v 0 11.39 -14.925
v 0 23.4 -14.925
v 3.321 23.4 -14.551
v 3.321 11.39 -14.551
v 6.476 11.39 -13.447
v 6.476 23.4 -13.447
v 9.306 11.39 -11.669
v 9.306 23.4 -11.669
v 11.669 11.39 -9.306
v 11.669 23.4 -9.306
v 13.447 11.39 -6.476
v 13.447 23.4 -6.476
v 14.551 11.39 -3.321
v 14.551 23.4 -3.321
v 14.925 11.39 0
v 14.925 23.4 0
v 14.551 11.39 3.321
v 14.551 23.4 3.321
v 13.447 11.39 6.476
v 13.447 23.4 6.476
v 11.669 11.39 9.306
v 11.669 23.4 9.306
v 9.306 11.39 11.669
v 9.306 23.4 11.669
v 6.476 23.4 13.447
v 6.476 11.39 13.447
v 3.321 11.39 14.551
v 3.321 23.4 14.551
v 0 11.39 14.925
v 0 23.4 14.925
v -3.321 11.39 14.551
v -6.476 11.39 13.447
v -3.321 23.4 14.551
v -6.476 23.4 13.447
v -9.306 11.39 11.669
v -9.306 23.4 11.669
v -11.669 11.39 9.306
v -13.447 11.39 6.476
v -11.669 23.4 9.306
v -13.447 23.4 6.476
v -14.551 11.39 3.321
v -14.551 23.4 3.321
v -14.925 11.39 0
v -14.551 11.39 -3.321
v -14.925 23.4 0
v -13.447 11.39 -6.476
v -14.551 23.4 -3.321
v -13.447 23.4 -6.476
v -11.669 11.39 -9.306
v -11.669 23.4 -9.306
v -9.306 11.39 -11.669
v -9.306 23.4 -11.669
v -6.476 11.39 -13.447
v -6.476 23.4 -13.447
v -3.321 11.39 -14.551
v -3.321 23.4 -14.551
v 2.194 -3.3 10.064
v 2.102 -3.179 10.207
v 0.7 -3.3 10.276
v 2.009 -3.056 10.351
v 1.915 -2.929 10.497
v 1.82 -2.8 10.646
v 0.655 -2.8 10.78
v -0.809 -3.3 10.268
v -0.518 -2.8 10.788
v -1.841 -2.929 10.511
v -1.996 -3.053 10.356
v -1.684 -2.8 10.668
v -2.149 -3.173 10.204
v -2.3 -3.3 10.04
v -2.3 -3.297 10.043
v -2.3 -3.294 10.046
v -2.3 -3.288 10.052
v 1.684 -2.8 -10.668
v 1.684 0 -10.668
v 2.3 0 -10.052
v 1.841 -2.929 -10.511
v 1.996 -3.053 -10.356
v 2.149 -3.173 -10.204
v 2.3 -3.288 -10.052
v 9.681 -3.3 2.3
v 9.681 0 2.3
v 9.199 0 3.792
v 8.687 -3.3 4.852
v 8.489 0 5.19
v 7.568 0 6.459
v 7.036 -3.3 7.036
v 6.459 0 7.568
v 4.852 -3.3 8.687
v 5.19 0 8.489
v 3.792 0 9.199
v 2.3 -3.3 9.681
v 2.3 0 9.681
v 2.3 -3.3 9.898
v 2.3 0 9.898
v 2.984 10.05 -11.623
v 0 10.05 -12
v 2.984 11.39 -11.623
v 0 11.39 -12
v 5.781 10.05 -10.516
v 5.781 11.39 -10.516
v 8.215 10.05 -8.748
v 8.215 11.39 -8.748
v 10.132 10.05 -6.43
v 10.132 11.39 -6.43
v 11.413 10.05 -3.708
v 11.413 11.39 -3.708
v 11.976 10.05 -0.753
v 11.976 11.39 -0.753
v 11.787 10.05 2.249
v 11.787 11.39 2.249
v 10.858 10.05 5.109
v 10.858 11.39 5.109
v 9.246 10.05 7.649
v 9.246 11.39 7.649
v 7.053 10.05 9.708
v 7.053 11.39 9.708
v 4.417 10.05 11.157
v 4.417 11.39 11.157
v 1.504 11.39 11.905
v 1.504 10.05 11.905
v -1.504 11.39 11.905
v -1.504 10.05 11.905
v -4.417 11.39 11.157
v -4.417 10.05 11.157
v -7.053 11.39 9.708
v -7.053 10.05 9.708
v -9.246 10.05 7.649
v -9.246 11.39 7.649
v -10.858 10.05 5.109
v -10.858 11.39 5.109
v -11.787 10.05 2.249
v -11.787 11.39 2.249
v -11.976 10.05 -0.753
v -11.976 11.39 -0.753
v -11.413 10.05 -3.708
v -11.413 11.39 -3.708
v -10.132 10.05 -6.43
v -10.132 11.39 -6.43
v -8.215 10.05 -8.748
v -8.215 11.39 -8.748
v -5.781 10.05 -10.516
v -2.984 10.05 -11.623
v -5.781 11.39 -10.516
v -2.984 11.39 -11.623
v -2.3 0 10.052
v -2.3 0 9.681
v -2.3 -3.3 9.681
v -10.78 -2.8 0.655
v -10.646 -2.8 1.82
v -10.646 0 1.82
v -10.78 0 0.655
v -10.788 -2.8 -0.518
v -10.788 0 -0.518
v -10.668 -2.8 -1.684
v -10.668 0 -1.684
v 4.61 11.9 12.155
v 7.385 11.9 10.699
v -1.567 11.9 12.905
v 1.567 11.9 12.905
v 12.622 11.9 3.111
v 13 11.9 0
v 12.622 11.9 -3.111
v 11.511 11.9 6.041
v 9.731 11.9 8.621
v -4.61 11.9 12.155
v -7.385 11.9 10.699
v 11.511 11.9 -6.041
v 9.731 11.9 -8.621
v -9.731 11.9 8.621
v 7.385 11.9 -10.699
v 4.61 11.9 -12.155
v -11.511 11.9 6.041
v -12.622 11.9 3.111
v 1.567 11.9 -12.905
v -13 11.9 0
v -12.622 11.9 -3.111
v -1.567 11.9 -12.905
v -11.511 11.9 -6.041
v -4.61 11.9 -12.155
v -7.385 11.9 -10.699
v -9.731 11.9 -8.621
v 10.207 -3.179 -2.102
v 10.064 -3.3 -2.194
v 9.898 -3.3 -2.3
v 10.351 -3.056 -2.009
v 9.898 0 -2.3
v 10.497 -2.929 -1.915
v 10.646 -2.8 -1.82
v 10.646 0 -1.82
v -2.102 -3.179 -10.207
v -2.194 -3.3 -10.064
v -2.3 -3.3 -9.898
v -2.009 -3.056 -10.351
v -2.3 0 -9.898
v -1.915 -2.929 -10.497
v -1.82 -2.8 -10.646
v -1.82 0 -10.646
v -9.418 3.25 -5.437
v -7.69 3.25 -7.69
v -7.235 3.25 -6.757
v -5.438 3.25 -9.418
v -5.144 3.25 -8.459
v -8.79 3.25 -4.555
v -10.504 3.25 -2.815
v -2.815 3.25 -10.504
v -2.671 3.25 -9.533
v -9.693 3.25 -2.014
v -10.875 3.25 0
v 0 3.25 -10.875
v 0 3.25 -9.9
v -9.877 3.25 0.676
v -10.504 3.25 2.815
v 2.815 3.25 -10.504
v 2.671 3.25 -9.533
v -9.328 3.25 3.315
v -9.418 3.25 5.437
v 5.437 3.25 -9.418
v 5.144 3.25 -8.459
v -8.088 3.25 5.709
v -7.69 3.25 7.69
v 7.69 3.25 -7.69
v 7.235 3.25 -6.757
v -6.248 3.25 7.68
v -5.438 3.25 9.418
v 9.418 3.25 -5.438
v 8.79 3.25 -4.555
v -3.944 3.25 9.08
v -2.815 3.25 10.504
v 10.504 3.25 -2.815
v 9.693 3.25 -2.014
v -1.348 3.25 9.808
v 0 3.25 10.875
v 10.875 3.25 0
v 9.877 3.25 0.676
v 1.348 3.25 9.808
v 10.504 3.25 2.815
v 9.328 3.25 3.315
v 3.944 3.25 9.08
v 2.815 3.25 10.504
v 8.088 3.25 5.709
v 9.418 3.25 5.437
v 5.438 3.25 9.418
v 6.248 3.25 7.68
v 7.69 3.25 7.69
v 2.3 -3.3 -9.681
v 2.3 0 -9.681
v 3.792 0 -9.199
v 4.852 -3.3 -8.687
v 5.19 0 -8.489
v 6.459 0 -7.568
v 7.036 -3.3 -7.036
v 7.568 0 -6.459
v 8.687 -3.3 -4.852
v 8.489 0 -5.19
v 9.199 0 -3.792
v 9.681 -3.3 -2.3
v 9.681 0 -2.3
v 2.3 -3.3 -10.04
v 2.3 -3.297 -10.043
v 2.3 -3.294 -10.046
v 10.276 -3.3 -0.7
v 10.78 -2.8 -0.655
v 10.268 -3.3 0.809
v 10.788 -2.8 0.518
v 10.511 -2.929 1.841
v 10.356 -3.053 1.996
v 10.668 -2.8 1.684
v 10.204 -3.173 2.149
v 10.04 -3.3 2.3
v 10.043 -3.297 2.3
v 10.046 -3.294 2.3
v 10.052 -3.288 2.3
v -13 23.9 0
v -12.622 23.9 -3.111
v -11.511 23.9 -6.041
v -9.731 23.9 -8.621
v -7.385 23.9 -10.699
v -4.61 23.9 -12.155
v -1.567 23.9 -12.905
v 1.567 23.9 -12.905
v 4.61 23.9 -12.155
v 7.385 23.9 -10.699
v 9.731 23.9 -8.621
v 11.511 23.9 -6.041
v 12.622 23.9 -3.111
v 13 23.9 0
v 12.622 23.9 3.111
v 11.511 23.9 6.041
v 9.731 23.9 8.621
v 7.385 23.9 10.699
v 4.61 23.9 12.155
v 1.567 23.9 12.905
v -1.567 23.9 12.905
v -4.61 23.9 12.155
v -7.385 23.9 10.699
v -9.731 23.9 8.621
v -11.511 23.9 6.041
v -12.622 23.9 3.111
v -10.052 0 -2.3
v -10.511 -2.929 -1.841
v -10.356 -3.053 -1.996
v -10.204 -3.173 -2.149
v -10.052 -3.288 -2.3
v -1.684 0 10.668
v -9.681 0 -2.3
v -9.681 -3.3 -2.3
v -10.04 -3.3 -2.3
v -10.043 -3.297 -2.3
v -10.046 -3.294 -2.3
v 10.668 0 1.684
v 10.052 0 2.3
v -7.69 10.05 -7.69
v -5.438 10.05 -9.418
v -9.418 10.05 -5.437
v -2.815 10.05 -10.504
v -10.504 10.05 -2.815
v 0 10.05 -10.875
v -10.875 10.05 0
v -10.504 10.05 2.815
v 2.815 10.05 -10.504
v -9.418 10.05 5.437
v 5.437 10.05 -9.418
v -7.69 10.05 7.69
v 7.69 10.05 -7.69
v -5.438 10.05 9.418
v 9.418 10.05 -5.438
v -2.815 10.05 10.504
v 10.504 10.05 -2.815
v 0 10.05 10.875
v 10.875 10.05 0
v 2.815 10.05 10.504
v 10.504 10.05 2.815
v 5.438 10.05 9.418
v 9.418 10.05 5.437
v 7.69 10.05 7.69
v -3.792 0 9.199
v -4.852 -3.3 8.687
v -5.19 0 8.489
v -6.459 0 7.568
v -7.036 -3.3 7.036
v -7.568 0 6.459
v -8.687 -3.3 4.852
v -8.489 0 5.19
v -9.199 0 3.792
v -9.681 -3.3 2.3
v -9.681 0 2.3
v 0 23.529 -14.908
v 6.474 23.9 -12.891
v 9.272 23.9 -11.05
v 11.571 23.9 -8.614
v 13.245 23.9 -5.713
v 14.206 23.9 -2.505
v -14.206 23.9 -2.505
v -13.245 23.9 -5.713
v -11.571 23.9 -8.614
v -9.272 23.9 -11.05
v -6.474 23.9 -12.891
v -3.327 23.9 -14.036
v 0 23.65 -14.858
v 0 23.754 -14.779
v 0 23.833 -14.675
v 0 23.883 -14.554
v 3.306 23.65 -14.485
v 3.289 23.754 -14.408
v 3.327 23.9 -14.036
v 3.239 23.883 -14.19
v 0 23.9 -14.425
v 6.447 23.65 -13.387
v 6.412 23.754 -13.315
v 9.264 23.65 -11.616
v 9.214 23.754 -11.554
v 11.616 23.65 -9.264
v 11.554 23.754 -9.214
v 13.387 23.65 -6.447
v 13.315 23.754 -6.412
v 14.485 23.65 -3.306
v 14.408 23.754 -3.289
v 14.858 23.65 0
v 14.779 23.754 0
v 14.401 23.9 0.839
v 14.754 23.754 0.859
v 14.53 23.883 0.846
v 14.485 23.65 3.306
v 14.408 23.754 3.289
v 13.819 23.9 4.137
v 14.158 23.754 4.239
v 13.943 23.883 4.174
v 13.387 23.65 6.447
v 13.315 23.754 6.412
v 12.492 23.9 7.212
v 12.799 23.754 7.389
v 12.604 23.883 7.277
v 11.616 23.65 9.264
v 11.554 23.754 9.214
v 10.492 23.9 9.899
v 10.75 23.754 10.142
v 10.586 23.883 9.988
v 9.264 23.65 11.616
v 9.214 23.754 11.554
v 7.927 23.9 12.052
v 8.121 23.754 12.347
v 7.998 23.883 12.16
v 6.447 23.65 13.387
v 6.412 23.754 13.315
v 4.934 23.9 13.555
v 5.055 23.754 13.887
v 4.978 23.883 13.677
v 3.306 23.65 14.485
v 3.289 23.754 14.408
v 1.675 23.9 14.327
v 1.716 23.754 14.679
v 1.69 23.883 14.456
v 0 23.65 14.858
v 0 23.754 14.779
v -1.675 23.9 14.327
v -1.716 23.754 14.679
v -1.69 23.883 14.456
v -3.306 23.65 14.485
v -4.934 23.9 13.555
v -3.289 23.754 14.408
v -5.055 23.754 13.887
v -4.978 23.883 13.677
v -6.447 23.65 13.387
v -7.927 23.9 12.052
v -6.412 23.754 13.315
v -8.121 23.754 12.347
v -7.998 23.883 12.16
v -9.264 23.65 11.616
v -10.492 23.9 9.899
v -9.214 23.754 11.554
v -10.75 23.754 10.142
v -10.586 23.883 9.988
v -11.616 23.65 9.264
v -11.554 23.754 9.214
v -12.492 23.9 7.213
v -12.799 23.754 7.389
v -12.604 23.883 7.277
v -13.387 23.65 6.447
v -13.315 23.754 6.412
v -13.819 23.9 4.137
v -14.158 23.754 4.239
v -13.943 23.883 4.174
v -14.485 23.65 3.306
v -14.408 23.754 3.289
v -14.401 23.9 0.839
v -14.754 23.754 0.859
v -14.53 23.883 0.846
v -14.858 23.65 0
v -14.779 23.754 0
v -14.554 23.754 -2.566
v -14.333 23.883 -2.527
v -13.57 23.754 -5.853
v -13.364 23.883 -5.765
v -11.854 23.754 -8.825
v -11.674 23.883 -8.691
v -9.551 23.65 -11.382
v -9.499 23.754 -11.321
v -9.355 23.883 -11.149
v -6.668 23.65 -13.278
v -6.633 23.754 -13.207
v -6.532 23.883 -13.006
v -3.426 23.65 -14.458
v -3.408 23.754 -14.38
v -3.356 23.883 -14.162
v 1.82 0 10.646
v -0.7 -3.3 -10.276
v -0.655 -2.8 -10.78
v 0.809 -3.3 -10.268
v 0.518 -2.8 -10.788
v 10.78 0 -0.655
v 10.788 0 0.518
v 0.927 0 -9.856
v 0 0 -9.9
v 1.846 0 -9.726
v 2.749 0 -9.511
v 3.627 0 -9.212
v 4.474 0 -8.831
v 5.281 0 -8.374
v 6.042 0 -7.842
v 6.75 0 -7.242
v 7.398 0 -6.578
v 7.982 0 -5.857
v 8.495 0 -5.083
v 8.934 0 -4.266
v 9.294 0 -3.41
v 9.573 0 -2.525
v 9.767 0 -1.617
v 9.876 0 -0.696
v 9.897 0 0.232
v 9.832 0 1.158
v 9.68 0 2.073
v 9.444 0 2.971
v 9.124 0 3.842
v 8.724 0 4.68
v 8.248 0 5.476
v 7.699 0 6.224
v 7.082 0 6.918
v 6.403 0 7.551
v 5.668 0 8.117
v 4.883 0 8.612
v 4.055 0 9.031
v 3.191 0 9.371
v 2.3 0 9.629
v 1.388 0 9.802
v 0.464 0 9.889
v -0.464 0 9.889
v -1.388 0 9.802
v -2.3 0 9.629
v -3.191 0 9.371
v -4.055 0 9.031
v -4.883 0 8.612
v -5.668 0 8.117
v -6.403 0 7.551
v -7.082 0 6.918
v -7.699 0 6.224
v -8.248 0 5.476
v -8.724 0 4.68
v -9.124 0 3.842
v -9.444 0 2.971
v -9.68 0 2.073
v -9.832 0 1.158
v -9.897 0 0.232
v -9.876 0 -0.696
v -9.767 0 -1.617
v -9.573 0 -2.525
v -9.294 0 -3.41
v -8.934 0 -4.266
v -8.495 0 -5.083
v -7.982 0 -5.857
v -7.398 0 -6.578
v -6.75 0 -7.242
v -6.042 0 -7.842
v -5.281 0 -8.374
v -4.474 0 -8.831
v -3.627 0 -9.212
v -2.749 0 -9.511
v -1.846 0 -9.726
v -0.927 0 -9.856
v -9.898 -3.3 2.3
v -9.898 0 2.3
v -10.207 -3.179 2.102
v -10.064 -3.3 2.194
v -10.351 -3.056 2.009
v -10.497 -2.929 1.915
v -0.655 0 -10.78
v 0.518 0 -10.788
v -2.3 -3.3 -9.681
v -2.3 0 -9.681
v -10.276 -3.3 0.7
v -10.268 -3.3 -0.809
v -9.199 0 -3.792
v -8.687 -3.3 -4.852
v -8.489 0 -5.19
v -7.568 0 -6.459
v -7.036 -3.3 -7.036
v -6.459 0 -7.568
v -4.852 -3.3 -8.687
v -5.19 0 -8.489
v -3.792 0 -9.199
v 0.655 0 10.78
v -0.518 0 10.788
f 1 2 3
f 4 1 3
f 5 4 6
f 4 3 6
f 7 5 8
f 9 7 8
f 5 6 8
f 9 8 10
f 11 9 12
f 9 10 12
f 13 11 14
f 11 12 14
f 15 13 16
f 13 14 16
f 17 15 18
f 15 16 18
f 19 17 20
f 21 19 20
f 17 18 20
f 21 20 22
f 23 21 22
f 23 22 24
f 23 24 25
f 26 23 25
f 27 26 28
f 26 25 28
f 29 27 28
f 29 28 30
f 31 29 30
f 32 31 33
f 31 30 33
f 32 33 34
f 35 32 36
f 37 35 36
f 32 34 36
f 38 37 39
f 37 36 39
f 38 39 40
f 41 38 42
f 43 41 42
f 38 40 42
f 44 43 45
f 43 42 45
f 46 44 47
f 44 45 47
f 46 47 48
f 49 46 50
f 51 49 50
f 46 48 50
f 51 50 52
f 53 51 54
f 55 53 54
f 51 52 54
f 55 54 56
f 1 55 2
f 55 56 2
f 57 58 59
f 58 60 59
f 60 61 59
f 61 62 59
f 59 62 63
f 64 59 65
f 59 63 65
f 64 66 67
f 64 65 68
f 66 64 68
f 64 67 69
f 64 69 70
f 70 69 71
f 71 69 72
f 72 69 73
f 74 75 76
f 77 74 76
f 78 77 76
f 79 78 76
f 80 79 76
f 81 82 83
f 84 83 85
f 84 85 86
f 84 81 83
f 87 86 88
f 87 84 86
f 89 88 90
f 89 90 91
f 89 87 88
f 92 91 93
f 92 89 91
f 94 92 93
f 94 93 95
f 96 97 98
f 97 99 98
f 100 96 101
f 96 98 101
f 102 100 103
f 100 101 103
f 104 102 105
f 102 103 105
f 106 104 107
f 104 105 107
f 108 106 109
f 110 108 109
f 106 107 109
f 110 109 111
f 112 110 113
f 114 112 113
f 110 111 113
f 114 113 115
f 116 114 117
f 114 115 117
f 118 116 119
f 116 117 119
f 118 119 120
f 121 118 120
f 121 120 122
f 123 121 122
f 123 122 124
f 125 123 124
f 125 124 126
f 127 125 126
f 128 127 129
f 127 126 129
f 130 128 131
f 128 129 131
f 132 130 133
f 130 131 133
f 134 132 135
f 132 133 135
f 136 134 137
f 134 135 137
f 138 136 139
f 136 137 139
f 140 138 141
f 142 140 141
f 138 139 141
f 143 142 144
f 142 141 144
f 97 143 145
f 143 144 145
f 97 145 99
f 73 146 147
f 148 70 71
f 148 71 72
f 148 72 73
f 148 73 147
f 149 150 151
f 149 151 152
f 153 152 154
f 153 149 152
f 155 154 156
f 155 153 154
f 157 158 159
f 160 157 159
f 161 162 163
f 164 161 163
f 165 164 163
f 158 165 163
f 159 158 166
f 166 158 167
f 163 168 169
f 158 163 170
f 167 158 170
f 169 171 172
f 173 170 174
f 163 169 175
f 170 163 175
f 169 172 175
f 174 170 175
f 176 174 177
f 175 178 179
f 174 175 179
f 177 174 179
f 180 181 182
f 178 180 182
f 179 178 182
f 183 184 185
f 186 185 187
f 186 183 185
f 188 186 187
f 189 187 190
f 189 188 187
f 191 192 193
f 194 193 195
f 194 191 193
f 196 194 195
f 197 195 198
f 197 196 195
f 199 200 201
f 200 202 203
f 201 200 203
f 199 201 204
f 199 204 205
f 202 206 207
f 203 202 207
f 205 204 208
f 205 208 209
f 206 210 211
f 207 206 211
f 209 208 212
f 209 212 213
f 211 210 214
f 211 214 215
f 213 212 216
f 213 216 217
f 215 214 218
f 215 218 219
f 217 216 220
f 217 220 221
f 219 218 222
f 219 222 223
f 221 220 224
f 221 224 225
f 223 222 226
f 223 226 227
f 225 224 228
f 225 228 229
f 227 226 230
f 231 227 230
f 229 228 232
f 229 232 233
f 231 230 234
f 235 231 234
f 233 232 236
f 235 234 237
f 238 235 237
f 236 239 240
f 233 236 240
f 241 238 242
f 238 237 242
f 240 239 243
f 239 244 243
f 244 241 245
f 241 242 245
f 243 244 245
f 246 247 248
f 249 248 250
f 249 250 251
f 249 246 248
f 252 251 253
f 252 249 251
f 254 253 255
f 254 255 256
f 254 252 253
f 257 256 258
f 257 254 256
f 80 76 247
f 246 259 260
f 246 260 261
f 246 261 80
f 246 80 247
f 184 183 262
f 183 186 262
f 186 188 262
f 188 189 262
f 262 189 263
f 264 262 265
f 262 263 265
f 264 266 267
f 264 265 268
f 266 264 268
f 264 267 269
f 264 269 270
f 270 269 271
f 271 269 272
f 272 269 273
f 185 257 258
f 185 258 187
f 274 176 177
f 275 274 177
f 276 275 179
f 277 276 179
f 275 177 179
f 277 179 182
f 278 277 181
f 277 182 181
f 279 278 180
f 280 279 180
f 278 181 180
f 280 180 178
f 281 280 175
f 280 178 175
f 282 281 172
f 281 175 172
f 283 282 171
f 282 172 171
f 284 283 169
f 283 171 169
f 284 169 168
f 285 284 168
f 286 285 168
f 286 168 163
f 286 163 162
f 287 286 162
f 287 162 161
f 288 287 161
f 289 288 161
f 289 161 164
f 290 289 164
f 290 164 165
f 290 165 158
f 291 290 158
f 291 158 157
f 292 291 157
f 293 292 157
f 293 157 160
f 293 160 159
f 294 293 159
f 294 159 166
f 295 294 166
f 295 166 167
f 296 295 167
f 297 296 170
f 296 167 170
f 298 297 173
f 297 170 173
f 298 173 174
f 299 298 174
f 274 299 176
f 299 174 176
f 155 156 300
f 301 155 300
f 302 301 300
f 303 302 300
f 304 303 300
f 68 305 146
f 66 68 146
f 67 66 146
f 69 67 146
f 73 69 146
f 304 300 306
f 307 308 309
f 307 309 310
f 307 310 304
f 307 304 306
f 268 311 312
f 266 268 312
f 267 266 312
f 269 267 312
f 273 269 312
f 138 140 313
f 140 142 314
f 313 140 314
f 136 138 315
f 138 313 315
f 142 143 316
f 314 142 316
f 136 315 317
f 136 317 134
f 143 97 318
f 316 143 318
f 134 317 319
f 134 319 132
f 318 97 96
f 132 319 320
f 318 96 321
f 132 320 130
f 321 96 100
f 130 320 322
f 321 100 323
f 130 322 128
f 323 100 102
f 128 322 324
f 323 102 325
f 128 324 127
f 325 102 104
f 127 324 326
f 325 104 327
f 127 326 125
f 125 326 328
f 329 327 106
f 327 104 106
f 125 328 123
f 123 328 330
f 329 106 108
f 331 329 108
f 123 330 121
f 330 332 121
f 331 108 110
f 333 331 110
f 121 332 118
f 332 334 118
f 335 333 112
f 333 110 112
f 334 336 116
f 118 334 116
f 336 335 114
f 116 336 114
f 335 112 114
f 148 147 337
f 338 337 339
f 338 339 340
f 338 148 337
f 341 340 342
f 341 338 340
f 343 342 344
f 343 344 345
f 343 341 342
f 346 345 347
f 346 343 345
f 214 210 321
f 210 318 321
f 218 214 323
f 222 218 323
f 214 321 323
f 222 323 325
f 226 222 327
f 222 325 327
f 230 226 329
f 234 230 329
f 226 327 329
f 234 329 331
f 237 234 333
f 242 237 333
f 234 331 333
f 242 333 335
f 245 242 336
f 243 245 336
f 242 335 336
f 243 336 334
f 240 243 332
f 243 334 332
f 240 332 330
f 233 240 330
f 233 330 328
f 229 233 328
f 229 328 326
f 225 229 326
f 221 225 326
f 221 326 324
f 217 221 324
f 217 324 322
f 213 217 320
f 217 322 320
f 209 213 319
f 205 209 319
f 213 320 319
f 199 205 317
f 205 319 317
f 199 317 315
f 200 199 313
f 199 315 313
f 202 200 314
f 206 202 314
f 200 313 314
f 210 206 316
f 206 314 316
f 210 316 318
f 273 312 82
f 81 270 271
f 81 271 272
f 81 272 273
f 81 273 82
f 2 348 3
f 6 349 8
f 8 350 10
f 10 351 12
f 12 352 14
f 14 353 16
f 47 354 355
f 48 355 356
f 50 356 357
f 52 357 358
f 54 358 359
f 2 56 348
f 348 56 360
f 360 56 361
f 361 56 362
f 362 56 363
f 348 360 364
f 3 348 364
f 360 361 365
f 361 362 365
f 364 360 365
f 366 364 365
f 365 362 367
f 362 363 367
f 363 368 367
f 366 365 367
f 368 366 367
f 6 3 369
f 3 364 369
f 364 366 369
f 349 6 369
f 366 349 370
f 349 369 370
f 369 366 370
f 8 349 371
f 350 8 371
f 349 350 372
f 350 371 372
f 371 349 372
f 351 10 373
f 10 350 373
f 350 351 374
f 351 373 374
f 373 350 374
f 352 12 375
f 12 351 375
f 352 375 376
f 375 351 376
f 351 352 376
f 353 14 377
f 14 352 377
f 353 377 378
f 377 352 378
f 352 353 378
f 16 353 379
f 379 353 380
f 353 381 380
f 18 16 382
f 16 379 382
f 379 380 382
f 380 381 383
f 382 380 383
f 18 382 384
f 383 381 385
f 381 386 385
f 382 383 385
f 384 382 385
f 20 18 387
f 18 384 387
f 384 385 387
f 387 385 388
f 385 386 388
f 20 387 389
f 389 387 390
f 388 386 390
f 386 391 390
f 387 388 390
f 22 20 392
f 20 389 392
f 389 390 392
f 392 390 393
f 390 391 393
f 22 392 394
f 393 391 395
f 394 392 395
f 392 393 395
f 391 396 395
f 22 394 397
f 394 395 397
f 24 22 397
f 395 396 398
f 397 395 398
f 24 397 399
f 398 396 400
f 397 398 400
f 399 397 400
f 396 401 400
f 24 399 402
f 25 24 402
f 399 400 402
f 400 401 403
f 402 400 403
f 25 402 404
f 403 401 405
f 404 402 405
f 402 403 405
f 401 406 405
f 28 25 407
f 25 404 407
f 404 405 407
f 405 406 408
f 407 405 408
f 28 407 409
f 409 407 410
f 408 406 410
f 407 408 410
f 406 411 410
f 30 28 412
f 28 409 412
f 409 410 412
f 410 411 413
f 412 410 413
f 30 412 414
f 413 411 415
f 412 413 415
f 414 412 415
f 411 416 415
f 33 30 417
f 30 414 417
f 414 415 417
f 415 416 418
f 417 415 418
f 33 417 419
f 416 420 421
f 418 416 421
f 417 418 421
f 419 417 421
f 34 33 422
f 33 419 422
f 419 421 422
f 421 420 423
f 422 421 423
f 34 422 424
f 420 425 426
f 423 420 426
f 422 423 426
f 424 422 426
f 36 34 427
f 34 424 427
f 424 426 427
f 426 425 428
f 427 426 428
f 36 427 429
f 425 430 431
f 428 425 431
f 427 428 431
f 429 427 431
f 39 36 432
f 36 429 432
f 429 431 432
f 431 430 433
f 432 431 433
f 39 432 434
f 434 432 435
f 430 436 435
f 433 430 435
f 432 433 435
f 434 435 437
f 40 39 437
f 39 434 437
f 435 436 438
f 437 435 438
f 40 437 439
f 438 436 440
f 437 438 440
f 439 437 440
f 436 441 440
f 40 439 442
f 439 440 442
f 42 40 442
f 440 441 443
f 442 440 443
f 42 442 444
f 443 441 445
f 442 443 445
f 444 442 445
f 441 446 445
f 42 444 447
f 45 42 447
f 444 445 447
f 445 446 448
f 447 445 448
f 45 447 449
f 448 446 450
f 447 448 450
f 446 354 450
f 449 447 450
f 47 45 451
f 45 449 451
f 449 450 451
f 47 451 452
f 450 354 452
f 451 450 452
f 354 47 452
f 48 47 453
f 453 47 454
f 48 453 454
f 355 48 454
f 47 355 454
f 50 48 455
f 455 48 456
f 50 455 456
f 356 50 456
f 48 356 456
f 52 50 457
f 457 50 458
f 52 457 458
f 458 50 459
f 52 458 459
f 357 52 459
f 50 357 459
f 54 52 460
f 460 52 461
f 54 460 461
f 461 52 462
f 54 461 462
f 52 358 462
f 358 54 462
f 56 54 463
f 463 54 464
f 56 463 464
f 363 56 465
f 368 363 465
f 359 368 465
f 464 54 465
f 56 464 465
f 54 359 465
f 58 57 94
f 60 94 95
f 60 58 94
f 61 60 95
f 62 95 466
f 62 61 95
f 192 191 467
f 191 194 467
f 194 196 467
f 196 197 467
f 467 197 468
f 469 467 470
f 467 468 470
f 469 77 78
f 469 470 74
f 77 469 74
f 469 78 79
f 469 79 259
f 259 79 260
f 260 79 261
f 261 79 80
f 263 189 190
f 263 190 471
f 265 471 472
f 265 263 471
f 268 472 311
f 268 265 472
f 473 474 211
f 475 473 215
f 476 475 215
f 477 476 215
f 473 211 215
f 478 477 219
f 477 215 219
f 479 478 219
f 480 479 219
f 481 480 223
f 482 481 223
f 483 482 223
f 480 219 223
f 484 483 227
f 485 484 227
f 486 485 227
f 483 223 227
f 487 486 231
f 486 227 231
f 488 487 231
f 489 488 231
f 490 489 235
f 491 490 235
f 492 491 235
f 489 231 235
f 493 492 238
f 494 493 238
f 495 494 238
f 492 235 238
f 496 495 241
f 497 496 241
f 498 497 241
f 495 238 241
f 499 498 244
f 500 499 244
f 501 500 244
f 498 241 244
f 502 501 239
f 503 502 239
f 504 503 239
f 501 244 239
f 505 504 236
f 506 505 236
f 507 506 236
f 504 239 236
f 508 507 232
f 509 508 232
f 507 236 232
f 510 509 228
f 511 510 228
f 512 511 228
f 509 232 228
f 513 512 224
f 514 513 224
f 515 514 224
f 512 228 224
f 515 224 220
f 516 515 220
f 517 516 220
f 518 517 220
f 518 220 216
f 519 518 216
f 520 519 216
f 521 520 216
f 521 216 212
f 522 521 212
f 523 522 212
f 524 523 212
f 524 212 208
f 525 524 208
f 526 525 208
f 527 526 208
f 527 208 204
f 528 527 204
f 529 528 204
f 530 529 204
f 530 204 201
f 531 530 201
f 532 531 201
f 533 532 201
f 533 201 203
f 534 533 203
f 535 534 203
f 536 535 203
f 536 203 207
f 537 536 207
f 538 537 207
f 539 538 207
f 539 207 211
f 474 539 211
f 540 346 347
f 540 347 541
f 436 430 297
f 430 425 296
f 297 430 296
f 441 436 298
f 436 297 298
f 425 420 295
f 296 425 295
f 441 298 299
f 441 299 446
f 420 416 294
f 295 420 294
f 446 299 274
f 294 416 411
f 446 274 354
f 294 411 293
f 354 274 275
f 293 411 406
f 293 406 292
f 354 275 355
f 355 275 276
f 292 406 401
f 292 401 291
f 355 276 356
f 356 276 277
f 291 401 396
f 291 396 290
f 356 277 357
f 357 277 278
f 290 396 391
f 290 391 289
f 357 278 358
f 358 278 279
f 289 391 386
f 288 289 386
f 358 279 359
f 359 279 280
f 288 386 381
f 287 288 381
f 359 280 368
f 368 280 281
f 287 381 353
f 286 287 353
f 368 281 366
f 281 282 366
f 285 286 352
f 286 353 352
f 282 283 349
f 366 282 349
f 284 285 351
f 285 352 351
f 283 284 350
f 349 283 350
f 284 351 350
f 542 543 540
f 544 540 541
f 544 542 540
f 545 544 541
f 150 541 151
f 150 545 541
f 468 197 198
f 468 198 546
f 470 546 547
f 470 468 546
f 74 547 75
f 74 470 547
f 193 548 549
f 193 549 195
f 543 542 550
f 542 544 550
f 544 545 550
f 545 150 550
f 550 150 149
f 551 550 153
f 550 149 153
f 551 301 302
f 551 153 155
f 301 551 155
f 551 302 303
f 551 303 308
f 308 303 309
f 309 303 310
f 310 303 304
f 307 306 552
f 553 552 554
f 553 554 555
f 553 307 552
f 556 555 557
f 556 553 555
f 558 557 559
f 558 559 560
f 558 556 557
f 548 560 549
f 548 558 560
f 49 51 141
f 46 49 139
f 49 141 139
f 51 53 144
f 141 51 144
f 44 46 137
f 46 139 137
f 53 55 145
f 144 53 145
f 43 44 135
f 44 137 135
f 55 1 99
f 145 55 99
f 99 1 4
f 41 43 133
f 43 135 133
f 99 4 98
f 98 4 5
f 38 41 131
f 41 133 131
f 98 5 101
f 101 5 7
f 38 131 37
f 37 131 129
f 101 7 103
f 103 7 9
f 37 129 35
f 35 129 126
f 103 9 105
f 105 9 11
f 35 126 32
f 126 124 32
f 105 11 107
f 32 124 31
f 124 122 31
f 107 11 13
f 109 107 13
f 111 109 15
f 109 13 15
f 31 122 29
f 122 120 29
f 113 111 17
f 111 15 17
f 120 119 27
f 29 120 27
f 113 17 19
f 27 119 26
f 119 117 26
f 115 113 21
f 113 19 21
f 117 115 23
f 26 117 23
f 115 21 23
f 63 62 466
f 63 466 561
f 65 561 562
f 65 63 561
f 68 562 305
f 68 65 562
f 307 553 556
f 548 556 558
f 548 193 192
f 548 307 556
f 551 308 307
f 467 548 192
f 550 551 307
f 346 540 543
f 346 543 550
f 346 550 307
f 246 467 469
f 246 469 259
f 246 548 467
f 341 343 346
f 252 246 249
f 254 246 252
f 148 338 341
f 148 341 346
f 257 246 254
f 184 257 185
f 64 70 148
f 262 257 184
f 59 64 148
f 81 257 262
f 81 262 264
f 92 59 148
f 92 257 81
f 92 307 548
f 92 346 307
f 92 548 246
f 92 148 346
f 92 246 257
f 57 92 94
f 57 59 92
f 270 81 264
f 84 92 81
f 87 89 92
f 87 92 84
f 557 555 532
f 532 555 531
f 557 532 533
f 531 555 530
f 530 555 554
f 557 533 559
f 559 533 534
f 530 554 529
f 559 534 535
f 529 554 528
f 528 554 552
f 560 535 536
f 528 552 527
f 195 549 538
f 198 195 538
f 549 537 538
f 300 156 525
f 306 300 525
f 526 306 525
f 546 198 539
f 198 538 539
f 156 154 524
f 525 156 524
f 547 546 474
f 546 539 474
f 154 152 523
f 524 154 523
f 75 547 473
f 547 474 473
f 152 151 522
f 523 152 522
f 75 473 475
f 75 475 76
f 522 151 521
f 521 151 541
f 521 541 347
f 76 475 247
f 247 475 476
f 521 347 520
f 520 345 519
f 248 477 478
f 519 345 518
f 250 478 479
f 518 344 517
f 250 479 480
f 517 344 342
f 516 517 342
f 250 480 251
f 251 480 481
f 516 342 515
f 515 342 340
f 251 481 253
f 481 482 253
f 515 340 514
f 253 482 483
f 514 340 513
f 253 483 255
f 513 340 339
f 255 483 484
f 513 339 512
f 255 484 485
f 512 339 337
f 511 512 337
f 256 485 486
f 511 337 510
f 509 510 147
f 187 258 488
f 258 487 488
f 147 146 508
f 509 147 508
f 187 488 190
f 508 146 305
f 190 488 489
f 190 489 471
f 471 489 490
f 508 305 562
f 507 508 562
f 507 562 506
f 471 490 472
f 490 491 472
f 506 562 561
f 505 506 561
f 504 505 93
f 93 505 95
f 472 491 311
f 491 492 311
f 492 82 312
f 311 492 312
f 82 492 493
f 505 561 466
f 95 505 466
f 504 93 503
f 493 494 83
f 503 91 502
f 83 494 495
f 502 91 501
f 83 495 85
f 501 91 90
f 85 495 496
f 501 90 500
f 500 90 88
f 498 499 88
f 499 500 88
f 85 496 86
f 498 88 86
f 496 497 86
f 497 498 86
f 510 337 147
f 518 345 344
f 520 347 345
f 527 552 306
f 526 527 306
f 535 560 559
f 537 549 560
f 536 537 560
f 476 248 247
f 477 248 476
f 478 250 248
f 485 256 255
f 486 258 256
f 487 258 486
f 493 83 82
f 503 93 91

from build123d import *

# Parameters (mm, degrees)
BOSS_EXTRUDE1_DEPTH       = 3.3
M22_CLEARANCE_HOLE1_D     = 26
M22_CLEARANCE_HOLE1_DEPTH = 12
CHAMFER1_SIZE             = 0.5
FILLET1_R                 = 0.5


with BuildPart() as part:
    # Sketch1 → Boss-Extrude1 (new body)
    with BuildSketch(Plane.XZ.offset(3.3)):
        with BuildLine():
            Line((-2.3, 10.052250945), (-2.3, 9.68052168))
            ThreePointArc((-2.3, 9.68052168), (-7.035712473, 7.035712473), (-9.68052168, 2.3))
            Line((-9.68052168, 2.3), (-9.897884029, 2.3))
            Line((-9.897884029, 2.3), (-10.64555554, 1.819930558))
            ThreePointArc((-10.64555554, 1.819930558), (-10.799781696, 0.06866818), (-10.667837189, -1.684413755))
            Line((-10.667837189, -1.684413755), (-10.052250945, -2.3))
            Line((-10.052250945, -2.3), (-9.68052168, -2.3))
            ThreePointArc((-9.68052168, -2.3), (-7.035712473, -7.035712473), (-2.3, -9.68052168))
            Line((-2.3, -9.68052168), (-2.3, -9.897884029))
            Line((-2.3, -9.897884029), (-1.819930558, -10.64555554))
            ThreePointArc((-1.819930558, -10.64555554), (-0.06866818, -10.799781696), (1.684413755, -10.667837189))
            Line((1.684413755, -10.667837189), (2.3, -10.052250945))
            Line((2.3, -10.052250945), (2.3, -9.68052168))
            ThreePointArc((2.3, -9.68052168), (7.035712473, -7.035712473), (9.68052168, -2.3))
            Line((9.68052168, -2.3), (9.897884029, -2.3))
            Line((9.897884029, -2.3), (10.64555554, -1.819930558))
            ThreePointArc((10.64555554, -1.819930558), (10.799781696, -0.06866818), (10.667837189, 1.684413755))
            Line((10.667837189, 1.684413755), (10.052250945, 2.3))
            Line((10.052250945, 2.3), (9.68052168, 2.3))
            ThreePointArc((9.68052168, 2.3), (7.035712473, 7.035712473), (2.3, 9.68052168))
            Line((2.3, 9.68052168), (2.3, 9.897884029))
            Line((2.3, 9.897884029), (1.819930558, 10.64555554))
            ThreePointArc((1.819930558, 10.64555554), (0.06866818, 10.799781696), (-1.684413755, 10.667837189))
            Line((-1.684413755, 10.667837189), (-2.3, 10.052250945))
        make_face()
    extrude(amount=-BOSS_EXTRUDE1_DEPTH)

    # Sketch2 → Revolve1 (revolve)
    with BuildSketch(Plane.XY, mode=Mode.PRIVATE) as revolve1_sk:
        Polygon((14.925, 23.9), (0, 23.9), (0, 0), (9.9, 0), (9.9, 3.25), (10.875, 3.25), (10.875, 10.05), (12, 10.05), (12, 11.39), (14.925, 11.39), align=None)
    revolve(revolve1_sk.sketch.rotate(Axis((0, 23.9, 0), (0, -1, 0)), 270), axis=Axis((0, 23.9, 0), (0, -1, 0)))

    # M22 Clearance Hole1
    with Locations(Plane(origin=(0, 23.9, 0), x_dir=(1, 0, 0), z_dir=(0, 1, 0))):
        with Locations((0, 0)):
            Hole(M22_CLEARANCE_HOLE1_D / 2, depth=M22_CLEARANCE_HOLE1_DEPTH)

    # Chamfer1
    chamfer1_edges = [part.edges().sort_by_distance(p)[0] for p in [
        (-10.799781696, -3.3, 0.06866818),
        (0.06866818, -3.3, 10.799781696),
        (-0.06866818, -3.3, -10.799781696),
        (10.799781696, -3.3, -0.06866818),
    ]]
    chamfer(chamfer1_edges, length=CHAMFER1_SIZE)

    # Fillet1
    fillet1_edges = [part.edges().sort_by_distance(p)[0] for p in [
        (0, 23.9, 14.925),
    ]]
    fillet(fillet1_edges, radius=FILLET1_R)


solid = part.part
